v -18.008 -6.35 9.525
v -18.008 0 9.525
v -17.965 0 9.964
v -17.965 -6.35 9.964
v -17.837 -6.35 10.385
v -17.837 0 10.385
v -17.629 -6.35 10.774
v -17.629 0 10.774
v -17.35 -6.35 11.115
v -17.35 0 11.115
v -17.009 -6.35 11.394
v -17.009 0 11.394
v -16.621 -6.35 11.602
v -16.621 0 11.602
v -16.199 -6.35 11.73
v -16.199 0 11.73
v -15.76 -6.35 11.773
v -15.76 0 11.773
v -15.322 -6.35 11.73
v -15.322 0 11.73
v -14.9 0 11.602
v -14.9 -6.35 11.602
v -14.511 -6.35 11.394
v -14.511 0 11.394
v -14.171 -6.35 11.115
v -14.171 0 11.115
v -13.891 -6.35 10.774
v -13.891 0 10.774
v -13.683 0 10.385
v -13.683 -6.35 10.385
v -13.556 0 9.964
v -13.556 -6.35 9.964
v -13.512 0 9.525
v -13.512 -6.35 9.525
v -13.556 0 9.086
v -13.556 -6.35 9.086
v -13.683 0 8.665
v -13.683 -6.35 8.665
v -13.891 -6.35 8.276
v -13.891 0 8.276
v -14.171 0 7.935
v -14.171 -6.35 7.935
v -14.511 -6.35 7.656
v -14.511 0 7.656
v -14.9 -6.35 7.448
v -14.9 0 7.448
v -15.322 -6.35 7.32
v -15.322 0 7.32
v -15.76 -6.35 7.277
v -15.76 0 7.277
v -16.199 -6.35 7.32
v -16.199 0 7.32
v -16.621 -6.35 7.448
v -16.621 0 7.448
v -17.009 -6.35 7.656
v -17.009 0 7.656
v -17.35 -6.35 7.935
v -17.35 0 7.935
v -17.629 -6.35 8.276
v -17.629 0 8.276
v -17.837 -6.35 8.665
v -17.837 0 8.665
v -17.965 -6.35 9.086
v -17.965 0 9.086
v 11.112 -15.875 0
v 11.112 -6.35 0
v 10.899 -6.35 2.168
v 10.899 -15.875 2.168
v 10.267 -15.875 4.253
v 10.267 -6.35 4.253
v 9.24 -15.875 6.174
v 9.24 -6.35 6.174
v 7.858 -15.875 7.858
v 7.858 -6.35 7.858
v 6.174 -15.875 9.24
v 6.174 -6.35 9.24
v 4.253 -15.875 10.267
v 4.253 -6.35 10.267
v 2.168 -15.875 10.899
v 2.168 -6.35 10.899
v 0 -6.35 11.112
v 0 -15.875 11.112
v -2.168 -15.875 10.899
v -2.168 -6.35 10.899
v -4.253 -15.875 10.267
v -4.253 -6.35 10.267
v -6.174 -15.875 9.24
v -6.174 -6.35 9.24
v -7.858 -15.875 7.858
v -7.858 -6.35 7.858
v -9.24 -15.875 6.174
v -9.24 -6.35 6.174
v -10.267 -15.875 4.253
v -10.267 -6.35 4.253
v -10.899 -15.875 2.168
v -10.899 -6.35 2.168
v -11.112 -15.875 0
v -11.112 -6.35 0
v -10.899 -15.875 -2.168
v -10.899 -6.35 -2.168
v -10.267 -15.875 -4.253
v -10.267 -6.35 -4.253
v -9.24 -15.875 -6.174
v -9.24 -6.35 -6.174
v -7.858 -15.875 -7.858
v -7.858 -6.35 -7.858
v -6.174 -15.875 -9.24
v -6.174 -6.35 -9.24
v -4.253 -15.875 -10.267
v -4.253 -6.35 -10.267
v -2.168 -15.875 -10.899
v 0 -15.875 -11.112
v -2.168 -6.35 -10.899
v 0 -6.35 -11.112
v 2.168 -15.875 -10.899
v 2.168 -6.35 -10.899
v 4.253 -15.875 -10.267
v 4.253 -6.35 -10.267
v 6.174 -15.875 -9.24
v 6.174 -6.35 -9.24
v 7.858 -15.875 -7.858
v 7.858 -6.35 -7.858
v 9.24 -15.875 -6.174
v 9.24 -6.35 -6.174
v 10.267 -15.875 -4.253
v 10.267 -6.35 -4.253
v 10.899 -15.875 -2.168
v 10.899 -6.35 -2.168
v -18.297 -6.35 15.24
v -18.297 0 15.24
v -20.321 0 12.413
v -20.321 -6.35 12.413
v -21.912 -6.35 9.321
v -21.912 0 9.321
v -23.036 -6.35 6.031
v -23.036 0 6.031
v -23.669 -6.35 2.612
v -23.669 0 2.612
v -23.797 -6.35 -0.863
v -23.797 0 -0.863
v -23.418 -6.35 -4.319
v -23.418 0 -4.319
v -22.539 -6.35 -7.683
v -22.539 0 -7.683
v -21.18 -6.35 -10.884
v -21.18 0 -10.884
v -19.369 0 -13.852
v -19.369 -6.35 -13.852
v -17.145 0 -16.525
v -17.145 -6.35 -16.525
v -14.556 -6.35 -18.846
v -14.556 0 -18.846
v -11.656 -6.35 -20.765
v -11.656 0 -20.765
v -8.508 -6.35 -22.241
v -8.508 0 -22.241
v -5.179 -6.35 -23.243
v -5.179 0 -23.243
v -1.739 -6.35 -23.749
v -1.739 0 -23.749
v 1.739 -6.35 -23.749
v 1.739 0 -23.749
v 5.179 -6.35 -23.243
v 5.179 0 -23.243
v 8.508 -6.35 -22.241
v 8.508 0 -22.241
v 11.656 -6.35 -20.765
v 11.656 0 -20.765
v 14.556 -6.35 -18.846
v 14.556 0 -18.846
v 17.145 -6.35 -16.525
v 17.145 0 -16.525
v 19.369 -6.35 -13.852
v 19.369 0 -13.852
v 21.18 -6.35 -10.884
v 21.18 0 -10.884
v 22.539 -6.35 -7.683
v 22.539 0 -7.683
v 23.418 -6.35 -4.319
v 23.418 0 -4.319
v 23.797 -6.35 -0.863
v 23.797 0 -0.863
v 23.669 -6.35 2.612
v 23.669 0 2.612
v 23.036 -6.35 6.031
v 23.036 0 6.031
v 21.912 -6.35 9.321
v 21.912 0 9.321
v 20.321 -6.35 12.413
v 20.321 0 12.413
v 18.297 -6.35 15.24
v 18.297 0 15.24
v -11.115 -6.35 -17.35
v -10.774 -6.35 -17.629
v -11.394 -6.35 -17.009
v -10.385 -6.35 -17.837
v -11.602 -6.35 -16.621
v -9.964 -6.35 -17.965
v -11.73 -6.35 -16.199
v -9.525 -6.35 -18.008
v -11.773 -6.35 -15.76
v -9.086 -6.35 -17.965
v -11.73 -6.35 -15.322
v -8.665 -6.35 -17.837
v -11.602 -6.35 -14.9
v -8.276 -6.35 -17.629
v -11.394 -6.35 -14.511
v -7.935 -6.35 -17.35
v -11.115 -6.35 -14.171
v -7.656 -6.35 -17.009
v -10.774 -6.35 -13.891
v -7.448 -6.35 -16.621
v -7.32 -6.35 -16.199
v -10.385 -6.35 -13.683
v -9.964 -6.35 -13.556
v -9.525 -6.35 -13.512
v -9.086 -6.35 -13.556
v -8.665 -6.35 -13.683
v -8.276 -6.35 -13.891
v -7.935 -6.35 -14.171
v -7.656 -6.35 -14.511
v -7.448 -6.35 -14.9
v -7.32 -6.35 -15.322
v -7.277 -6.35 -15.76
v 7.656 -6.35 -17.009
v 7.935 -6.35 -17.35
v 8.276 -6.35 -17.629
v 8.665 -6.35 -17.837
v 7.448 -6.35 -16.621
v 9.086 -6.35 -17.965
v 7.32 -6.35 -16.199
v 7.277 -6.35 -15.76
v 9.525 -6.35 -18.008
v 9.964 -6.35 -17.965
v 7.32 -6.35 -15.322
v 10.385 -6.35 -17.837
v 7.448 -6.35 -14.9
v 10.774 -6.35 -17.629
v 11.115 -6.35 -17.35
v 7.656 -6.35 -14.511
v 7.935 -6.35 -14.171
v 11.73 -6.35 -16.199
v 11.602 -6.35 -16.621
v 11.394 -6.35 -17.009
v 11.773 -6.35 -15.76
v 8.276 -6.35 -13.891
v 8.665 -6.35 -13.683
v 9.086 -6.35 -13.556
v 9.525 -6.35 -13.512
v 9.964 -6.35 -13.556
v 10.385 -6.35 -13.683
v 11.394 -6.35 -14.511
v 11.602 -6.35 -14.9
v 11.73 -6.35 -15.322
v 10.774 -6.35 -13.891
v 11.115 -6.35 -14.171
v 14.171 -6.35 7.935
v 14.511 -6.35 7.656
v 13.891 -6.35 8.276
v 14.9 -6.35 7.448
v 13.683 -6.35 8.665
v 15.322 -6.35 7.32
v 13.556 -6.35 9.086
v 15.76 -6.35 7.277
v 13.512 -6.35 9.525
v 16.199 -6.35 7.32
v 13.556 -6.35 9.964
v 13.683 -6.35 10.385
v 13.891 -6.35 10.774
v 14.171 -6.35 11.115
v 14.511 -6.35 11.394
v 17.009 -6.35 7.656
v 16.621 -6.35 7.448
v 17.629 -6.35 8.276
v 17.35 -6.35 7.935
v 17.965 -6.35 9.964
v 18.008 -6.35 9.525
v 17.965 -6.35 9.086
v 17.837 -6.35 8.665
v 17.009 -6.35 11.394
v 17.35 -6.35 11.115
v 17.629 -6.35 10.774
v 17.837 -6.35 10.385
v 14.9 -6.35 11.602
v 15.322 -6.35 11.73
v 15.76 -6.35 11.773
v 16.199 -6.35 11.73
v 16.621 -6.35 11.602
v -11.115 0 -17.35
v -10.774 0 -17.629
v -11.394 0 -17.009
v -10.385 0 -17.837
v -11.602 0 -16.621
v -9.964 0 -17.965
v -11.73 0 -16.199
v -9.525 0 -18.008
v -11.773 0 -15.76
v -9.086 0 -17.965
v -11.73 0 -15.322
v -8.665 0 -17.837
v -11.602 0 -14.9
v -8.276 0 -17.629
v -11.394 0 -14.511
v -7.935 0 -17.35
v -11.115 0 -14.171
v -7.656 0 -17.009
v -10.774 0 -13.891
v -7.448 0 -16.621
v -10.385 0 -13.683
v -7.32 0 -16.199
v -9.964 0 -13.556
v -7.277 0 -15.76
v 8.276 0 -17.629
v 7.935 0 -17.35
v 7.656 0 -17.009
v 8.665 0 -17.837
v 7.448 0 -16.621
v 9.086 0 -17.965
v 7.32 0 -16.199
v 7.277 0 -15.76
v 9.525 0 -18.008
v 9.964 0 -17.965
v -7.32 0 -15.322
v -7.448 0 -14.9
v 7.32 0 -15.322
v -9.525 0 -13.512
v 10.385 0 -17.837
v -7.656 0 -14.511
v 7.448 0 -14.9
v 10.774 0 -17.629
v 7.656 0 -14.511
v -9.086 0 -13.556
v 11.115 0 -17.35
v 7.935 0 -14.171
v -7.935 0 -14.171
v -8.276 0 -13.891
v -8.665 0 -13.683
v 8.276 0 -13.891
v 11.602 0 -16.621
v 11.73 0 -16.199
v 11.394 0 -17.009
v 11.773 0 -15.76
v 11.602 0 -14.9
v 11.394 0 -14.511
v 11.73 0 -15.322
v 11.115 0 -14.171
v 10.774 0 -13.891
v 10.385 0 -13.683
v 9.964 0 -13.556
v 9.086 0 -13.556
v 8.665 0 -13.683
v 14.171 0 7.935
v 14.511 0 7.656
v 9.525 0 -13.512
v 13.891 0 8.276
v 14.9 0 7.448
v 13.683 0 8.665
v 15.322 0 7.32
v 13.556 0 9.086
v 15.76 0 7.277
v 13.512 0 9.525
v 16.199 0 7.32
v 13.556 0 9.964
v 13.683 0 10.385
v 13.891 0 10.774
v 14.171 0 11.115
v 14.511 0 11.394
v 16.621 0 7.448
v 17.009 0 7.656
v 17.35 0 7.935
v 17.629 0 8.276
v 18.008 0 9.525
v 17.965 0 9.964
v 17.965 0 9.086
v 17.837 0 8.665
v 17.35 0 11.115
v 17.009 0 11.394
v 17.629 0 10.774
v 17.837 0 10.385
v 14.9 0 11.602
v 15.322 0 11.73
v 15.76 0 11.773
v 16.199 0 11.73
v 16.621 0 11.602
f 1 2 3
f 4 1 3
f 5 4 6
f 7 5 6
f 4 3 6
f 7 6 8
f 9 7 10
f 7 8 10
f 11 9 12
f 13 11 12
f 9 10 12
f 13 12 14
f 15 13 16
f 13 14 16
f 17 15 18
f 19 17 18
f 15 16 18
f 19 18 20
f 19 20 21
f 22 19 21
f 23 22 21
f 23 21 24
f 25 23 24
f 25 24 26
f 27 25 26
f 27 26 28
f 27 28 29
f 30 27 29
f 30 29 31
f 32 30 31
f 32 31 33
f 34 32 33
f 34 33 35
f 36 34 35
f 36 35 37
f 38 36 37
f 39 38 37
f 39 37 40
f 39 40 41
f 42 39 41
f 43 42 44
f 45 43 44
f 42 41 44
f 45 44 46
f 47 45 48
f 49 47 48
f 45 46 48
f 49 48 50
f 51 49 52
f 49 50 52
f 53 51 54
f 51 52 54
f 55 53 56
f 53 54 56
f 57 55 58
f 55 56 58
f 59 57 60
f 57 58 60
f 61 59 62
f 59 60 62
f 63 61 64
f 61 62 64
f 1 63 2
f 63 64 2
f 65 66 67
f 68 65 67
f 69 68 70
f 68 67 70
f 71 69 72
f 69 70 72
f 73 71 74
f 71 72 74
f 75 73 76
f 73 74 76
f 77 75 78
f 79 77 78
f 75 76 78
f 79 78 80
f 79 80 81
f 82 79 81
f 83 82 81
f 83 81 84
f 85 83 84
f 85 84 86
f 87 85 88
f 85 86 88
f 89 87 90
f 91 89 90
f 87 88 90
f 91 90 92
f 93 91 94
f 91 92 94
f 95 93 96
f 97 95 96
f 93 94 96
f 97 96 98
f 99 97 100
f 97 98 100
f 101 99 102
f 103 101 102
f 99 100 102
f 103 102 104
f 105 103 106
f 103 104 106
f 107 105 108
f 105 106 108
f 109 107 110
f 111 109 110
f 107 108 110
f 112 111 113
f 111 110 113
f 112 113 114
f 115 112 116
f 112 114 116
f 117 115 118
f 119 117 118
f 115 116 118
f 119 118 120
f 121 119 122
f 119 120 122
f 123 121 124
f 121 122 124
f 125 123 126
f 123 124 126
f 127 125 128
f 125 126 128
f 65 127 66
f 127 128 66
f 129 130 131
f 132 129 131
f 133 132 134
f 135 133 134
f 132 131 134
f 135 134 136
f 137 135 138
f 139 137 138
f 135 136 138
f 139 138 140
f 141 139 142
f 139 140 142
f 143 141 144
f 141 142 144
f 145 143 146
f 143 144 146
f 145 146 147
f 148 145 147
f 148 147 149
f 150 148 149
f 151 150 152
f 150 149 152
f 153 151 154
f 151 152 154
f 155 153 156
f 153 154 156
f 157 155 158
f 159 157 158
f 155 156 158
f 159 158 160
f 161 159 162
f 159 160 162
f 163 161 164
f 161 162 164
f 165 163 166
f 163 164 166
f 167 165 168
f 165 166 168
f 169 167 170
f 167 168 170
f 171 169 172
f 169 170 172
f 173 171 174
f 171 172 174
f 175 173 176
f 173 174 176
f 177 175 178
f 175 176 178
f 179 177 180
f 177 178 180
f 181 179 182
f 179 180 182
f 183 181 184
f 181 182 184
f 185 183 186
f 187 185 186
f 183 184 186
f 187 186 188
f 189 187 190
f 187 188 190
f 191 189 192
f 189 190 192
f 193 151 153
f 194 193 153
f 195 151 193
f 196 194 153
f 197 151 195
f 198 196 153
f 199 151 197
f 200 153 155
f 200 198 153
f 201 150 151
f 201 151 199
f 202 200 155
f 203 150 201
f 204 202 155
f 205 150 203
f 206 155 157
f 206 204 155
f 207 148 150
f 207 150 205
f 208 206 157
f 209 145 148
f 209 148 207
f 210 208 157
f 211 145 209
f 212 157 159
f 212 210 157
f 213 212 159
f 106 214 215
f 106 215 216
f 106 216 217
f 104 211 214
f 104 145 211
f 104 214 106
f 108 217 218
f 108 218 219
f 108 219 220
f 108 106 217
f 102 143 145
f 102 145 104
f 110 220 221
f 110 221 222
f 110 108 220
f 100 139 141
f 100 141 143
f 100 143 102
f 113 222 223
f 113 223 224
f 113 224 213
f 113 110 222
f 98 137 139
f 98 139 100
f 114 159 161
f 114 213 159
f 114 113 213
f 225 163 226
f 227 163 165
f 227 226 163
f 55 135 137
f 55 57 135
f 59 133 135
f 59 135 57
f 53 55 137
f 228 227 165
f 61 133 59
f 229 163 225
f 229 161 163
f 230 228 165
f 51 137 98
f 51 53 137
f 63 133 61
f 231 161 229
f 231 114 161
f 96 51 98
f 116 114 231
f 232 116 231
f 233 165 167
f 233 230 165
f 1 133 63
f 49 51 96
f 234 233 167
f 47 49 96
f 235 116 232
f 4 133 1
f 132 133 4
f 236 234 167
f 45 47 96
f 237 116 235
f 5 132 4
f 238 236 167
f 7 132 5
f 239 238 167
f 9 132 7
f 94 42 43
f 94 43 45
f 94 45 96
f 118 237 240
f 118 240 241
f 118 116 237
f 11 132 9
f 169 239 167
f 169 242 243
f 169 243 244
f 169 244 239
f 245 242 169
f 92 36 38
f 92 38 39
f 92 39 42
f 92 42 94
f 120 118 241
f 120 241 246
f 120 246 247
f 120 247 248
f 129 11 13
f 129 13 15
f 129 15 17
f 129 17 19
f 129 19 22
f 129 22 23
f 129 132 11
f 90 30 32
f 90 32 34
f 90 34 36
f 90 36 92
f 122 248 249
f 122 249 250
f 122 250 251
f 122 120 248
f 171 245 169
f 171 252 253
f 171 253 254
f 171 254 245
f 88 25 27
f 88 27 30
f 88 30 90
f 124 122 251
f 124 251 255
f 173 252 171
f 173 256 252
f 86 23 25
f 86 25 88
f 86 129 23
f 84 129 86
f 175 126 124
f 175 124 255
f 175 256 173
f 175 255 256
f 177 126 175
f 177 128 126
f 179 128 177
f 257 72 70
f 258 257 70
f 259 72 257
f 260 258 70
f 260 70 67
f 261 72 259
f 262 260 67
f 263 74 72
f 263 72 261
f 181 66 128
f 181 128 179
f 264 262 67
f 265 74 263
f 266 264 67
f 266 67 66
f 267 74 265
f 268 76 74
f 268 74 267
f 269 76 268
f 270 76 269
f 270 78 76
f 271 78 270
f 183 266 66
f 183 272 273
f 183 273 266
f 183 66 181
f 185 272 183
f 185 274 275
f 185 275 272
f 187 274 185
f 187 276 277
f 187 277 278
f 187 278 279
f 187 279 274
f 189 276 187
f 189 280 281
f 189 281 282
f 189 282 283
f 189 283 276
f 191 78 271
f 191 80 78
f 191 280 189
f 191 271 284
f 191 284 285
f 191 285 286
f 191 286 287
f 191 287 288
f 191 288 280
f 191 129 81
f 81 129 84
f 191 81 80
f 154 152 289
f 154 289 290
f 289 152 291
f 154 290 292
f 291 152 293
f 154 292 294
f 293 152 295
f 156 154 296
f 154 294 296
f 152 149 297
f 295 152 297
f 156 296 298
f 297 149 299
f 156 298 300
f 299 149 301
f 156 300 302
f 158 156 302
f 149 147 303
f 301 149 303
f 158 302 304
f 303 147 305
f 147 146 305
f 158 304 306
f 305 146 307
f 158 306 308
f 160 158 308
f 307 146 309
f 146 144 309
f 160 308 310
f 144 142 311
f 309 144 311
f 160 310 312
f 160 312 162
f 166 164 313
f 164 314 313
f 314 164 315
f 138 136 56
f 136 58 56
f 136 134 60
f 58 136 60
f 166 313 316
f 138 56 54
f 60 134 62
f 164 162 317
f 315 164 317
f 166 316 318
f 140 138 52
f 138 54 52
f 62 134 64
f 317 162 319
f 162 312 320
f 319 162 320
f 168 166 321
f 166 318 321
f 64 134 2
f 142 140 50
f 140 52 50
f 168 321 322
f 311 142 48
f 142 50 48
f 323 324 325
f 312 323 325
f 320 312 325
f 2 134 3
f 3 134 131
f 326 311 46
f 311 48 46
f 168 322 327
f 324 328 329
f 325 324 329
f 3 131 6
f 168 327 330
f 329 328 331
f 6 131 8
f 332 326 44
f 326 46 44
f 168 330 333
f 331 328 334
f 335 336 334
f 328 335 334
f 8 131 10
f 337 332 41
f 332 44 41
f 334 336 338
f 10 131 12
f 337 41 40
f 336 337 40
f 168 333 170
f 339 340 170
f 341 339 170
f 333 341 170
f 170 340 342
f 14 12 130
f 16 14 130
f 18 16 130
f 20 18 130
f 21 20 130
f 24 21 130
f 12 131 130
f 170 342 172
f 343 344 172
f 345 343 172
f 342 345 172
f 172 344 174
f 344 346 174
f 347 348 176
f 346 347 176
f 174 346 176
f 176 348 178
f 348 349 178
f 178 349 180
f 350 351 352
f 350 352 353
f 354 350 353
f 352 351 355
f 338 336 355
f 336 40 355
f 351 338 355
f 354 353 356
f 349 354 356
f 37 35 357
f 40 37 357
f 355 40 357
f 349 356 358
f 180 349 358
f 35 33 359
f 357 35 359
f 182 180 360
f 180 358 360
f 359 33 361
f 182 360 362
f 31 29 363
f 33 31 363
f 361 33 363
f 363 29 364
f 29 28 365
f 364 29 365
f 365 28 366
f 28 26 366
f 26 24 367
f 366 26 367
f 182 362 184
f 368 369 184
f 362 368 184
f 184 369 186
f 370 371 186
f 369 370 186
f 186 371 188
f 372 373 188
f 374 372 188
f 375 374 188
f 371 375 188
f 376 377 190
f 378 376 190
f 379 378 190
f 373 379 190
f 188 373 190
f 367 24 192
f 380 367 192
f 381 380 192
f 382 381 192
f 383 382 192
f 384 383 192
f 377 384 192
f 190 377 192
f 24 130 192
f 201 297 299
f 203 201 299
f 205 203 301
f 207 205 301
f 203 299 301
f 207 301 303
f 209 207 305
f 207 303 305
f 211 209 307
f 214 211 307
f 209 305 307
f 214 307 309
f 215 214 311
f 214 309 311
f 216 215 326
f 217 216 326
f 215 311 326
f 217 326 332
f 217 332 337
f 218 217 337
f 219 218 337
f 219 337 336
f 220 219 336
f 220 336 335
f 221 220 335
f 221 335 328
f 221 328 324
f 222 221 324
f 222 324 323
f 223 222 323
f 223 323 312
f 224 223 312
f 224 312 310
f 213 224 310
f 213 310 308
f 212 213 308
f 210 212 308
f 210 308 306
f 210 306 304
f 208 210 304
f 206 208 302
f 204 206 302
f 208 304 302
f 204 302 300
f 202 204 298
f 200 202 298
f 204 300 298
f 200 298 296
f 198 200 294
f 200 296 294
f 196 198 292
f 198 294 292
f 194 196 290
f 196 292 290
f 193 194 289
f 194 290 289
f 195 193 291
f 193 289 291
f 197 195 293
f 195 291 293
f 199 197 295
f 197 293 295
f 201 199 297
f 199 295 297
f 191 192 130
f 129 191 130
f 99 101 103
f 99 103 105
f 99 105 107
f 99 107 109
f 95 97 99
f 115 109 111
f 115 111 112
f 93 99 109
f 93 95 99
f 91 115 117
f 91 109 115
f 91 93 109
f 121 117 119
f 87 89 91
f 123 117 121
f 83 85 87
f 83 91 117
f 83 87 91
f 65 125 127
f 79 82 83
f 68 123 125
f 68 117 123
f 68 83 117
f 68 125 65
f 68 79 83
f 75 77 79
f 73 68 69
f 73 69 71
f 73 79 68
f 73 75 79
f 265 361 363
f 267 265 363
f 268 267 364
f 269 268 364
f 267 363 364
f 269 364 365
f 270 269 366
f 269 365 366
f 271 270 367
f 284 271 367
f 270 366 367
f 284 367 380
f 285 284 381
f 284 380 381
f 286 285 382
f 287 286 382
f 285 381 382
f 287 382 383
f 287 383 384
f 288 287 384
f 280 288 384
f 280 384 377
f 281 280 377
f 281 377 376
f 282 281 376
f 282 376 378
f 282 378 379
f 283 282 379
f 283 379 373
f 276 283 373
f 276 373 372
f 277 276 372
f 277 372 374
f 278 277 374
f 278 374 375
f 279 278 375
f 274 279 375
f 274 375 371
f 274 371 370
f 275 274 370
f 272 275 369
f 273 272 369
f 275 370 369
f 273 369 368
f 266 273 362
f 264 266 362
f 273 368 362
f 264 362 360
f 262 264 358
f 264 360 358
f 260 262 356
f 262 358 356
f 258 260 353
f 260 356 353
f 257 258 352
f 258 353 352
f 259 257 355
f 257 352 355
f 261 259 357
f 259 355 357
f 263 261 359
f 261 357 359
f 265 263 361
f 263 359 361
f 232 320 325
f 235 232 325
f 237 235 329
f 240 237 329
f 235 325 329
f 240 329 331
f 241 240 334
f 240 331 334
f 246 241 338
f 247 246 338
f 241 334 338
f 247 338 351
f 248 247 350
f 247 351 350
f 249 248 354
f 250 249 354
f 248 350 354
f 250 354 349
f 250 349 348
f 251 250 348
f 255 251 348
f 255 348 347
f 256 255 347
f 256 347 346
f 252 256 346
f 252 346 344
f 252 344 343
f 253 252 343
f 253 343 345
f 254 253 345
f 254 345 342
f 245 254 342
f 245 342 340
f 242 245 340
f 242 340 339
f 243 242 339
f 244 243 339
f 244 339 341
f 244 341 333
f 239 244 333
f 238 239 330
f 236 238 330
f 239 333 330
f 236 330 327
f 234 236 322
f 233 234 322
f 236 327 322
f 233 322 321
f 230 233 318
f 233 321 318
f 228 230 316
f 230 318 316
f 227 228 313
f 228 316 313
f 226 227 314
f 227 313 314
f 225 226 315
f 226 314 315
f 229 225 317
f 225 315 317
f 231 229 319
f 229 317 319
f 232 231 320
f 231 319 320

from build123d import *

# Parameters (mm, degrees)
F1_DEPTH = 6.35
F3_D     = 4.4958
F4_R     = 11.1125
F5_DEPTH = 9.525


with BuildPart() as f1:
    # F0 (on Front) → F1 (new body)
    with BuildSketch(Plane.XZ):
        with BuildLine():
            Line((18.2969275085, 15.24), (-18.2969275085, 15.24))
            ThreePointArc((-18.2969275085, 15.24), (0, -23.8125), (18.2969275085, 15.24))
        make_face()
    extrude(amount=F1_DEPTH)

    # F3 (through all)
    with Locations(Plane.XZ.offset(6.35)):
        with Locations((-9.525, -15.7602855304), (-15.7602855304, 9.525), (15.7602855304, 9.525), (9.525, -15.7602855304)):
            Hole(F3_D / 2)

    # F4 (on face) → F5 (join)
    with BuildSketch(Plane.XZ.offset(6.35)):
        Circle(F4_R)
    extrude(amount=F5_DEPTH)


solid = f1.part
